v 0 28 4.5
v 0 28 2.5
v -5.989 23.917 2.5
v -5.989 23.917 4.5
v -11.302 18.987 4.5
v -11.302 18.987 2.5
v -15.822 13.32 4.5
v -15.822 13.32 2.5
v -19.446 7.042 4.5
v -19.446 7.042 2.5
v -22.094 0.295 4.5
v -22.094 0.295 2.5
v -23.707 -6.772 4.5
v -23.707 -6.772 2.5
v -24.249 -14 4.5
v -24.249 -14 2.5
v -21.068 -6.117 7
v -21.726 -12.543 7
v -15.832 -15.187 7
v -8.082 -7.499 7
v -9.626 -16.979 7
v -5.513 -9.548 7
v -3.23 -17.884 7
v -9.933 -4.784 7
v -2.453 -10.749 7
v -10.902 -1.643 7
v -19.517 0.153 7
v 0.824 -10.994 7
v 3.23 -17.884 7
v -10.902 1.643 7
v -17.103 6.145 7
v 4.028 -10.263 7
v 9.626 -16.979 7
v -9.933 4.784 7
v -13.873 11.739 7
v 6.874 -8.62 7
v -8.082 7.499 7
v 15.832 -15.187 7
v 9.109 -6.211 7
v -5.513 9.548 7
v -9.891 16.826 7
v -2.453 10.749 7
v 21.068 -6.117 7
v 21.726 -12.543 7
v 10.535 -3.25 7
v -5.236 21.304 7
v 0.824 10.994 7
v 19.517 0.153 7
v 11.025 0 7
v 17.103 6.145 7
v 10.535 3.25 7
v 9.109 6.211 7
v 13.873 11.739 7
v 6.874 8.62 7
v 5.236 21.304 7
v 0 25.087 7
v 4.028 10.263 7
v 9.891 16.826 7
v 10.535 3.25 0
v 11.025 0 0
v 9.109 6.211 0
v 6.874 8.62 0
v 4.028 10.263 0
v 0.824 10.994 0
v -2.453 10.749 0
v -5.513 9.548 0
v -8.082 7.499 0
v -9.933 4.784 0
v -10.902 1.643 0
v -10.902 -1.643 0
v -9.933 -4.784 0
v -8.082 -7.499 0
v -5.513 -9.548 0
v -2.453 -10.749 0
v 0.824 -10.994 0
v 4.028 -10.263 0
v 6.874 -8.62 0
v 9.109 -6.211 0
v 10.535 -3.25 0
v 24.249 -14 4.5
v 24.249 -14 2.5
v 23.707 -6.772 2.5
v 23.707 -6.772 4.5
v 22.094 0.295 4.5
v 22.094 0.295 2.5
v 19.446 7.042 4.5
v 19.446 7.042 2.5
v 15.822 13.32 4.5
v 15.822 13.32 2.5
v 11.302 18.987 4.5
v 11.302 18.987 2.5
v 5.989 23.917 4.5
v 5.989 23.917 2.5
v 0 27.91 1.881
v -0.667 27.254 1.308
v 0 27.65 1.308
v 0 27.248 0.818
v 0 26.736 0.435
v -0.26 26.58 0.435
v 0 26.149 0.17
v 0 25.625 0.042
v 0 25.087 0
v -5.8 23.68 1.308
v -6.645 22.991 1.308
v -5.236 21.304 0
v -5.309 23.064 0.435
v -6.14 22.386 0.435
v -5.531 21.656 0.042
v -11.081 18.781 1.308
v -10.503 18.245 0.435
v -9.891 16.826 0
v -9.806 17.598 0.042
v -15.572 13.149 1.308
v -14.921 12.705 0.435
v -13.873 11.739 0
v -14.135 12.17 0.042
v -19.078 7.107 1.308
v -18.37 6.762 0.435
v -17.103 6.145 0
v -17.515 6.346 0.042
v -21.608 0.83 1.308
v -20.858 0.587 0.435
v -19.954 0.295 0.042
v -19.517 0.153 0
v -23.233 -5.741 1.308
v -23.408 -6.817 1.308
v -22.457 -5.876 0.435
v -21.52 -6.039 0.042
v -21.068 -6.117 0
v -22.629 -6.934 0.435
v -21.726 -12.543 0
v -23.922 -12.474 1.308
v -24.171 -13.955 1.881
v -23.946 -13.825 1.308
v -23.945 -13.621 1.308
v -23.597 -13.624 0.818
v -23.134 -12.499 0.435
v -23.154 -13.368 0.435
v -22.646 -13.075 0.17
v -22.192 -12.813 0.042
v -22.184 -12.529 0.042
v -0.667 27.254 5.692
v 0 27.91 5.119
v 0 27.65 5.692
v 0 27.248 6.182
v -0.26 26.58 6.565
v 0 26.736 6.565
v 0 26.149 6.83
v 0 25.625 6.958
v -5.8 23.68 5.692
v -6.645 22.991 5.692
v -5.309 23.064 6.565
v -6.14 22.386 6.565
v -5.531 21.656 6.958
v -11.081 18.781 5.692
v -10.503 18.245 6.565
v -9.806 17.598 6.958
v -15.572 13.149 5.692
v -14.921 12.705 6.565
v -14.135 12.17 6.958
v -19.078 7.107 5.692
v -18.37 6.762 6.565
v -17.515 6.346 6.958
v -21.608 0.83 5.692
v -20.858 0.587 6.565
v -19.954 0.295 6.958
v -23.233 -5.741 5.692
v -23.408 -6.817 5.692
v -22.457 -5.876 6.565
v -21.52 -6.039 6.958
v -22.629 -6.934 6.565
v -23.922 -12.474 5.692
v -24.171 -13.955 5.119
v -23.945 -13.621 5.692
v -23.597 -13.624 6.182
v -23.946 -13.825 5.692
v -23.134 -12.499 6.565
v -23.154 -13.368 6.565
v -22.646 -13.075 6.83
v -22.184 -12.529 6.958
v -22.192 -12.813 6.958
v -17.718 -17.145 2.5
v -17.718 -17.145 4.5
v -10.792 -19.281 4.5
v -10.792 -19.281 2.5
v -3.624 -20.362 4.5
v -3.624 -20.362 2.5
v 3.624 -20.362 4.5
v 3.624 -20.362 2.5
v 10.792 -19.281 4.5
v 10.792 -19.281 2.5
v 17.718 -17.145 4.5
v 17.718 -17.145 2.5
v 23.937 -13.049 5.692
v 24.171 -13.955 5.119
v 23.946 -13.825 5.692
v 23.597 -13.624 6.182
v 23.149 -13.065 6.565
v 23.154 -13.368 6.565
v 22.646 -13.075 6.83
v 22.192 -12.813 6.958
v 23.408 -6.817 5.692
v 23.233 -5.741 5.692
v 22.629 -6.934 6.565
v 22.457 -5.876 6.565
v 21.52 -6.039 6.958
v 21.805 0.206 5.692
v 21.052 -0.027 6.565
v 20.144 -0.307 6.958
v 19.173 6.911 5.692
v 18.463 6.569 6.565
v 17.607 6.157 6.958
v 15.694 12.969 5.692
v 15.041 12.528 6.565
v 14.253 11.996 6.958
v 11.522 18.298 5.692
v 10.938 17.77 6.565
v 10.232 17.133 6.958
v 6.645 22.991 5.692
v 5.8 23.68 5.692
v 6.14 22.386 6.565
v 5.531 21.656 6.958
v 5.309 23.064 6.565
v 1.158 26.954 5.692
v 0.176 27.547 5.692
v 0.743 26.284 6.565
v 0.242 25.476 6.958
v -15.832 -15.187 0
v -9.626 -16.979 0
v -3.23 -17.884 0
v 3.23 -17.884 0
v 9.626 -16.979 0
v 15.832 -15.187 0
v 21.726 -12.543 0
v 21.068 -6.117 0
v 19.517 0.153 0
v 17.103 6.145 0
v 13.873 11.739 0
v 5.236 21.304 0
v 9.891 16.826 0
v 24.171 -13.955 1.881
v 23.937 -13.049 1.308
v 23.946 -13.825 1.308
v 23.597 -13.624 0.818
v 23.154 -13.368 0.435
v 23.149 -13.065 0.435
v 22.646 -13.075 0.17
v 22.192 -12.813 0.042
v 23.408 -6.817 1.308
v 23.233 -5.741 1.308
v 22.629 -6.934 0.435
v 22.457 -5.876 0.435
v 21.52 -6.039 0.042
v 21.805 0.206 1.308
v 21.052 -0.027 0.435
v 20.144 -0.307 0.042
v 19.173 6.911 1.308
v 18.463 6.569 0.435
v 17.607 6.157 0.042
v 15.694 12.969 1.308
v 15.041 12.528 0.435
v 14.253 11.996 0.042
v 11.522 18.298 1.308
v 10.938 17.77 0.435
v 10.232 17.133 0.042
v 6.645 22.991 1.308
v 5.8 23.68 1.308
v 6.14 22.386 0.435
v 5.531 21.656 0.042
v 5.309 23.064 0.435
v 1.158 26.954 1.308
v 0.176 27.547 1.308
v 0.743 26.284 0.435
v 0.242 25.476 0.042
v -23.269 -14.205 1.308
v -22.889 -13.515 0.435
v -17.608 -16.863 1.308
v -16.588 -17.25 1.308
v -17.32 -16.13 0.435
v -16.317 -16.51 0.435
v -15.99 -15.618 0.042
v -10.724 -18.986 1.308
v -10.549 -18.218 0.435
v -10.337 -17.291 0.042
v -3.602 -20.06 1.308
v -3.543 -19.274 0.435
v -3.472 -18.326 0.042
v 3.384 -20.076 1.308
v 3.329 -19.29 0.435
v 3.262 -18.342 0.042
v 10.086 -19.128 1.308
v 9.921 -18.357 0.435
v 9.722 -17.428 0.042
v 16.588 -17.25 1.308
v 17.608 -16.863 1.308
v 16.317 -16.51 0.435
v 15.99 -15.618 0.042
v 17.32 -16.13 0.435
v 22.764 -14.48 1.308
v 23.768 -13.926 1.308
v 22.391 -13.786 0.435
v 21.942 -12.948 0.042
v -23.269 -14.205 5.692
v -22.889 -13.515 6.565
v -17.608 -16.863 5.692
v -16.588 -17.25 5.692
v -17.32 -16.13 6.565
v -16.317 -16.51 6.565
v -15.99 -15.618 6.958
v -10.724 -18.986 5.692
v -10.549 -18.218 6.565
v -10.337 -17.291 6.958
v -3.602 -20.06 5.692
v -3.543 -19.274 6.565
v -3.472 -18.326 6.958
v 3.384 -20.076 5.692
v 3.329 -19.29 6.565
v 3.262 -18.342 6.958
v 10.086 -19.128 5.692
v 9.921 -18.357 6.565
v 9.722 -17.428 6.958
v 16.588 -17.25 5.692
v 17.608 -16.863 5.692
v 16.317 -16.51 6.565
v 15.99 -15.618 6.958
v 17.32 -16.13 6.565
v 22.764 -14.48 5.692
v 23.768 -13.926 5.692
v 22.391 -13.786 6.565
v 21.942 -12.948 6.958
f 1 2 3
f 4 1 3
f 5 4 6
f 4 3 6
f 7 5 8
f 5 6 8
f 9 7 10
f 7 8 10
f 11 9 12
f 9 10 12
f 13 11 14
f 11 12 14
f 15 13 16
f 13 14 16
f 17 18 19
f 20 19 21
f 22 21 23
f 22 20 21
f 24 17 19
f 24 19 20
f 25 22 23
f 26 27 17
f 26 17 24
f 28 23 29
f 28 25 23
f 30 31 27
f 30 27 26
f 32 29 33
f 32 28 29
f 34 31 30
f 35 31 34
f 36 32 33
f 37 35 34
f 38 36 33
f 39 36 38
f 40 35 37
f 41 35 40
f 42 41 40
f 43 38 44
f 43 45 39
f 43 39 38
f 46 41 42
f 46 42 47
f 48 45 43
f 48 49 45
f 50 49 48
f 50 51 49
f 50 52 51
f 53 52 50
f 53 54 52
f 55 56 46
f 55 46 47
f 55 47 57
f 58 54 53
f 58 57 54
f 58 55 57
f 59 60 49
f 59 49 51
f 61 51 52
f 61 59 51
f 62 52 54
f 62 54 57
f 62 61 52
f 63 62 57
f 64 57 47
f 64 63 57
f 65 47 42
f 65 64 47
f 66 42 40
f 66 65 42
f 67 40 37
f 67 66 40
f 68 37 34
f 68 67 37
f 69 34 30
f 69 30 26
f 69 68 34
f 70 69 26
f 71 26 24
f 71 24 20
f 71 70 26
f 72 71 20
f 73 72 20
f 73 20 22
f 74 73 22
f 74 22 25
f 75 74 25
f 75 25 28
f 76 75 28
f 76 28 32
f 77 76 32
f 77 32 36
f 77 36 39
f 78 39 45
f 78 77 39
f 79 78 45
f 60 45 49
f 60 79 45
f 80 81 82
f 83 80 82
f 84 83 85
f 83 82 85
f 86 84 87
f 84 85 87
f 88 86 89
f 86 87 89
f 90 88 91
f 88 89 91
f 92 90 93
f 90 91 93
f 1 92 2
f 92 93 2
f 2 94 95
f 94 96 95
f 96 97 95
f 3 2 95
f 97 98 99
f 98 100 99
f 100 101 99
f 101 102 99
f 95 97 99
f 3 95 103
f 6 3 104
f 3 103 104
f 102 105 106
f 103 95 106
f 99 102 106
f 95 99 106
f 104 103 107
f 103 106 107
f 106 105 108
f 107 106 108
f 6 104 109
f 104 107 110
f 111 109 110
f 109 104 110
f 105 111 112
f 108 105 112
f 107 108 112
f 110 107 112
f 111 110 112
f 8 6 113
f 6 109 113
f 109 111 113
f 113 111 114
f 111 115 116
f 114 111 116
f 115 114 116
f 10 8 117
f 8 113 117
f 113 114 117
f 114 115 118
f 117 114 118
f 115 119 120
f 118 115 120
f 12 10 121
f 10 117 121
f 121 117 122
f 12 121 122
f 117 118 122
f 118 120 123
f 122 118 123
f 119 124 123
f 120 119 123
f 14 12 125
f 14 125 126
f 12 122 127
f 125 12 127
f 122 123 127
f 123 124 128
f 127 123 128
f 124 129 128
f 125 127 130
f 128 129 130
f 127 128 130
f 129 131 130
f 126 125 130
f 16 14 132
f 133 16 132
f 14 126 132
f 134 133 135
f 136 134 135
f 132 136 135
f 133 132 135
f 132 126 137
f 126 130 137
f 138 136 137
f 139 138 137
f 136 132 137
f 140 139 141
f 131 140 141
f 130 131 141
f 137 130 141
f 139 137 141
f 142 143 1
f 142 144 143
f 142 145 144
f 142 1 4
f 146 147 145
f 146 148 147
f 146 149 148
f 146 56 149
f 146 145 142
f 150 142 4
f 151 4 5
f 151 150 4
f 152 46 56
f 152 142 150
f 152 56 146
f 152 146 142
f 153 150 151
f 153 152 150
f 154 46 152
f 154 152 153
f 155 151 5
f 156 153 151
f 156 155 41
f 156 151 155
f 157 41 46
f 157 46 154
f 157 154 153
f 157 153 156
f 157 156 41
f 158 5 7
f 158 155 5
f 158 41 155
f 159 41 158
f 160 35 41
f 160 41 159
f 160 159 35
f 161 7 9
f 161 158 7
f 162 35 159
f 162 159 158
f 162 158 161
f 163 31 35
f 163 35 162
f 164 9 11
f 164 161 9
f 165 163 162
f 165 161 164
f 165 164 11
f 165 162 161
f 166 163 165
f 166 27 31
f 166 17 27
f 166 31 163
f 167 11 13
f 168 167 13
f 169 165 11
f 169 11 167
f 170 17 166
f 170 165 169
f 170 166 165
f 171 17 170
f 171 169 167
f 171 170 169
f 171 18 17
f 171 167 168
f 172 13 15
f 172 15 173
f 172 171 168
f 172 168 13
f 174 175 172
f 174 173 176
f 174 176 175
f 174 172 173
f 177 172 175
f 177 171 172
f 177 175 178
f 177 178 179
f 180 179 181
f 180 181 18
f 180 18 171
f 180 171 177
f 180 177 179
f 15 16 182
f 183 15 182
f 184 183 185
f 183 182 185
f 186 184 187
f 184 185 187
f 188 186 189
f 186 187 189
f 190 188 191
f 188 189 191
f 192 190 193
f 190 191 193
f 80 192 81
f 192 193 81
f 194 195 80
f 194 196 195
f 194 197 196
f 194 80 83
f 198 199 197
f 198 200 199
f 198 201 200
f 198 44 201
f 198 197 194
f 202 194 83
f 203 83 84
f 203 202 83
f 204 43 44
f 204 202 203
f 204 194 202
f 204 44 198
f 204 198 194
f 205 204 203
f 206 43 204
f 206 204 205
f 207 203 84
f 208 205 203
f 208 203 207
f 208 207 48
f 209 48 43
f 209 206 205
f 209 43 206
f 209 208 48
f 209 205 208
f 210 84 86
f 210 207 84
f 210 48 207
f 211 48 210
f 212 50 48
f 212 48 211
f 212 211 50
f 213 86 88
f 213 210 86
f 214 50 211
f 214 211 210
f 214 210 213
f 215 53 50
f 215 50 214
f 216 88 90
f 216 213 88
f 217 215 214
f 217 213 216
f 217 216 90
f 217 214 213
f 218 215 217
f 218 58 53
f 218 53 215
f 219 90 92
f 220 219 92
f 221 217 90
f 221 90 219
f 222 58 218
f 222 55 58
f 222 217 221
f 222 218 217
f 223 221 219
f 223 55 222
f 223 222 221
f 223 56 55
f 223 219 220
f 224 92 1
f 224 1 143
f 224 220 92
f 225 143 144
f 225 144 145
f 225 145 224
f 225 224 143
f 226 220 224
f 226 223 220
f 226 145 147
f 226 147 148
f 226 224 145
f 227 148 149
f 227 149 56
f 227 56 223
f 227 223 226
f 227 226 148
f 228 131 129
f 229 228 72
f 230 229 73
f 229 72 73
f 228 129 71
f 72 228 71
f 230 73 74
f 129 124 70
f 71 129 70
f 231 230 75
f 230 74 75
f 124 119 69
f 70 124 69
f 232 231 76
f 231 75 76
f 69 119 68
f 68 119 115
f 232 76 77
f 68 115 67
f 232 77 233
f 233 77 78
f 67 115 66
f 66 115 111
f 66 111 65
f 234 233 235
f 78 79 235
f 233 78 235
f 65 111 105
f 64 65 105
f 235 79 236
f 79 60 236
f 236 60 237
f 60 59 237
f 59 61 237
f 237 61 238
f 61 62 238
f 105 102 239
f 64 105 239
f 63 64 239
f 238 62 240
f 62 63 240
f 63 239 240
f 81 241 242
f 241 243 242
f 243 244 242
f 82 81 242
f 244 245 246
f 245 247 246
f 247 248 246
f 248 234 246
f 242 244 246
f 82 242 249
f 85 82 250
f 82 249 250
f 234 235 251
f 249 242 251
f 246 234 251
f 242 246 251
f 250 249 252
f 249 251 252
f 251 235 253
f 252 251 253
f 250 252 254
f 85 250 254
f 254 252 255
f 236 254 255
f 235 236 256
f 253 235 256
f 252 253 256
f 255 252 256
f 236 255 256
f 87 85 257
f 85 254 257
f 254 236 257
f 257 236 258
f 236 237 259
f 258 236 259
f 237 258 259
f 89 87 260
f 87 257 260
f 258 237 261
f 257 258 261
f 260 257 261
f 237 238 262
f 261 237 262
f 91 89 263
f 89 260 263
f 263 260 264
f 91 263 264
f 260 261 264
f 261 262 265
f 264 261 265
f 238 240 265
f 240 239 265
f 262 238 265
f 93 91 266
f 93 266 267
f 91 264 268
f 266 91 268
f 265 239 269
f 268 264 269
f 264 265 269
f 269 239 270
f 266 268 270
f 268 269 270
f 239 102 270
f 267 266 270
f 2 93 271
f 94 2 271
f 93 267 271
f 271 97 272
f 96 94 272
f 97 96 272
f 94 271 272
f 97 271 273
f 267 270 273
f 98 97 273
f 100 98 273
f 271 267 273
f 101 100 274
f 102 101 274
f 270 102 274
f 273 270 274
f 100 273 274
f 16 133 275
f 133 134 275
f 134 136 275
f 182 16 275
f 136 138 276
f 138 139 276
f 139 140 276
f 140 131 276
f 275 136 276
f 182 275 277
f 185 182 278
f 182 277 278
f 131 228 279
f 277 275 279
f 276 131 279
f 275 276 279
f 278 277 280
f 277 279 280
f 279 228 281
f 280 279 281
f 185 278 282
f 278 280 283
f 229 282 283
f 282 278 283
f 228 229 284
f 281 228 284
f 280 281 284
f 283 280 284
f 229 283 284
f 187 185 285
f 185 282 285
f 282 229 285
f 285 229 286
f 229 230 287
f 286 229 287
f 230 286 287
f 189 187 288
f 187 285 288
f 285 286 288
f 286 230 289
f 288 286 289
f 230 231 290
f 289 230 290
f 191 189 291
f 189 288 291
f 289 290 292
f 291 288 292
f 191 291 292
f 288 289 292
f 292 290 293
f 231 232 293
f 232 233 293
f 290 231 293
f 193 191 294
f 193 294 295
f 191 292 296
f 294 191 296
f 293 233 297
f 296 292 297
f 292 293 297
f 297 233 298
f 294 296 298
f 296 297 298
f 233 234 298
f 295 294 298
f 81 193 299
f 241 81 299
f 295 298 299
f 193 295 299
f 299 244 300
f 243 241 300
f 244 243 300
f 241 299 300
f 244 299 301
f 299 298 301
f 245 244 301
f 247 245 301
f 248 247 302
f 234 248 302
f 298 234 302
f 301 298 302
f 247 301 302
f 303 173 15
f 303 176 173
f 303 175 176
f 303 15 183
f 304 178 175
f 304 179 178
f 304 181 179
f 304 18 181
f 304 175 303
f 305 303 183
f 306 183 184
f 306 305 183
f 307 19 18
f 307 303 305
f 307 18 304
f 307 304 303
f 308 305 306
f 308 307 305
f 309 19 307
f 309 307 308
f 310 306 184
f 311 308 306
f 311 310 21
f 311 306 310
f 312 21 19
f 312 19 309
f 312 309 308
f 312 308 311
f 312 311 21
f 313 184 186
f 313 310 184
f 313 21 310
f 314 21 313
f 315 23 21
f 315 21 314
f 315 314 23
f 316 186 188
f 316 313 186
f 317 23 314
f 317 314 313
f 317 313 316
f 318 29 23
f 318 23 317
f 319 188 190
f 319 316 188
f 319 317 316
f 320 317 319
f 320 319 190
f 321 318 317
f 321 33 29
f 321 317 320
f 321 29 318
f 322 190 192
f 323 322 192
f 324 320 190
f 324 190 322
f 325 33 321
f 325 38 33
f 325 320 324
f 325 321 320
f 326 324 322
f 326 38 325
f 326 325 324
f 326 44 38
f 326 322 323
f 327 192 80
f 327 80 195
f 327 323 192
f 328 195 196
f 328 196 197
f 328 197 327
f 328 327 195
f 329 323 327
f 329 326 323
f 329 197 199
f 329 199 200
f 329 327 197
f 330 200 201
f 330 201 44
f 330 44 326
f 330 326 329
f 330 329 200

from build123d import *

# Parameters (mm, degrees)
F0_R     = 11.025
F1_DEPTH = 7
F2_R     = 2.5


with BuildPart() as f1:
    # F0 (on Top) → F1 (new body)
    with BuildSketch(Plane.XY):
        with BuildLine():
            ThreePointArc((0, 28), (-17.751289, 10.248711), (-24.248711, -14))
            Line((-24.248711, -14), (0, 28))
        make_face()
        Polygon((-24.248711, -14), (24.248711, -14), (0, 28), align=None)
        Circle(F0_R, mode=Mode.SUBTRACT)
        with BuildLine():
            Line((0, 28), (24.248711, -14))
            ThreePointArc((24.248711, -14), (17.751289, 10.248711), (0, 28))
        make_face()
        with BuildLine():
            ThreePointArc((-24.248711, -14), (0, -20.497423), (24.248711, -14))
            Line((24.248711, -14), (-24.248711, -14))
        make_face()
    extrude(amount=F1_DEPTH)

    # F2
    f2_edges = [f1.edges().sort_by_distance(p)[0] for p in [
        (0, -20.497423, 7),
        (17.751289, 10.248711, 7),
        (-17.751289, 10.248711, 7),
        (0, -20.497423, 0),
        (17.751289, 10.248711, 0),
        (-17.751289, 10.248711, 0),
    ]]
    fillet(f2_edges, radius=F2_R)


solid = f1.part
